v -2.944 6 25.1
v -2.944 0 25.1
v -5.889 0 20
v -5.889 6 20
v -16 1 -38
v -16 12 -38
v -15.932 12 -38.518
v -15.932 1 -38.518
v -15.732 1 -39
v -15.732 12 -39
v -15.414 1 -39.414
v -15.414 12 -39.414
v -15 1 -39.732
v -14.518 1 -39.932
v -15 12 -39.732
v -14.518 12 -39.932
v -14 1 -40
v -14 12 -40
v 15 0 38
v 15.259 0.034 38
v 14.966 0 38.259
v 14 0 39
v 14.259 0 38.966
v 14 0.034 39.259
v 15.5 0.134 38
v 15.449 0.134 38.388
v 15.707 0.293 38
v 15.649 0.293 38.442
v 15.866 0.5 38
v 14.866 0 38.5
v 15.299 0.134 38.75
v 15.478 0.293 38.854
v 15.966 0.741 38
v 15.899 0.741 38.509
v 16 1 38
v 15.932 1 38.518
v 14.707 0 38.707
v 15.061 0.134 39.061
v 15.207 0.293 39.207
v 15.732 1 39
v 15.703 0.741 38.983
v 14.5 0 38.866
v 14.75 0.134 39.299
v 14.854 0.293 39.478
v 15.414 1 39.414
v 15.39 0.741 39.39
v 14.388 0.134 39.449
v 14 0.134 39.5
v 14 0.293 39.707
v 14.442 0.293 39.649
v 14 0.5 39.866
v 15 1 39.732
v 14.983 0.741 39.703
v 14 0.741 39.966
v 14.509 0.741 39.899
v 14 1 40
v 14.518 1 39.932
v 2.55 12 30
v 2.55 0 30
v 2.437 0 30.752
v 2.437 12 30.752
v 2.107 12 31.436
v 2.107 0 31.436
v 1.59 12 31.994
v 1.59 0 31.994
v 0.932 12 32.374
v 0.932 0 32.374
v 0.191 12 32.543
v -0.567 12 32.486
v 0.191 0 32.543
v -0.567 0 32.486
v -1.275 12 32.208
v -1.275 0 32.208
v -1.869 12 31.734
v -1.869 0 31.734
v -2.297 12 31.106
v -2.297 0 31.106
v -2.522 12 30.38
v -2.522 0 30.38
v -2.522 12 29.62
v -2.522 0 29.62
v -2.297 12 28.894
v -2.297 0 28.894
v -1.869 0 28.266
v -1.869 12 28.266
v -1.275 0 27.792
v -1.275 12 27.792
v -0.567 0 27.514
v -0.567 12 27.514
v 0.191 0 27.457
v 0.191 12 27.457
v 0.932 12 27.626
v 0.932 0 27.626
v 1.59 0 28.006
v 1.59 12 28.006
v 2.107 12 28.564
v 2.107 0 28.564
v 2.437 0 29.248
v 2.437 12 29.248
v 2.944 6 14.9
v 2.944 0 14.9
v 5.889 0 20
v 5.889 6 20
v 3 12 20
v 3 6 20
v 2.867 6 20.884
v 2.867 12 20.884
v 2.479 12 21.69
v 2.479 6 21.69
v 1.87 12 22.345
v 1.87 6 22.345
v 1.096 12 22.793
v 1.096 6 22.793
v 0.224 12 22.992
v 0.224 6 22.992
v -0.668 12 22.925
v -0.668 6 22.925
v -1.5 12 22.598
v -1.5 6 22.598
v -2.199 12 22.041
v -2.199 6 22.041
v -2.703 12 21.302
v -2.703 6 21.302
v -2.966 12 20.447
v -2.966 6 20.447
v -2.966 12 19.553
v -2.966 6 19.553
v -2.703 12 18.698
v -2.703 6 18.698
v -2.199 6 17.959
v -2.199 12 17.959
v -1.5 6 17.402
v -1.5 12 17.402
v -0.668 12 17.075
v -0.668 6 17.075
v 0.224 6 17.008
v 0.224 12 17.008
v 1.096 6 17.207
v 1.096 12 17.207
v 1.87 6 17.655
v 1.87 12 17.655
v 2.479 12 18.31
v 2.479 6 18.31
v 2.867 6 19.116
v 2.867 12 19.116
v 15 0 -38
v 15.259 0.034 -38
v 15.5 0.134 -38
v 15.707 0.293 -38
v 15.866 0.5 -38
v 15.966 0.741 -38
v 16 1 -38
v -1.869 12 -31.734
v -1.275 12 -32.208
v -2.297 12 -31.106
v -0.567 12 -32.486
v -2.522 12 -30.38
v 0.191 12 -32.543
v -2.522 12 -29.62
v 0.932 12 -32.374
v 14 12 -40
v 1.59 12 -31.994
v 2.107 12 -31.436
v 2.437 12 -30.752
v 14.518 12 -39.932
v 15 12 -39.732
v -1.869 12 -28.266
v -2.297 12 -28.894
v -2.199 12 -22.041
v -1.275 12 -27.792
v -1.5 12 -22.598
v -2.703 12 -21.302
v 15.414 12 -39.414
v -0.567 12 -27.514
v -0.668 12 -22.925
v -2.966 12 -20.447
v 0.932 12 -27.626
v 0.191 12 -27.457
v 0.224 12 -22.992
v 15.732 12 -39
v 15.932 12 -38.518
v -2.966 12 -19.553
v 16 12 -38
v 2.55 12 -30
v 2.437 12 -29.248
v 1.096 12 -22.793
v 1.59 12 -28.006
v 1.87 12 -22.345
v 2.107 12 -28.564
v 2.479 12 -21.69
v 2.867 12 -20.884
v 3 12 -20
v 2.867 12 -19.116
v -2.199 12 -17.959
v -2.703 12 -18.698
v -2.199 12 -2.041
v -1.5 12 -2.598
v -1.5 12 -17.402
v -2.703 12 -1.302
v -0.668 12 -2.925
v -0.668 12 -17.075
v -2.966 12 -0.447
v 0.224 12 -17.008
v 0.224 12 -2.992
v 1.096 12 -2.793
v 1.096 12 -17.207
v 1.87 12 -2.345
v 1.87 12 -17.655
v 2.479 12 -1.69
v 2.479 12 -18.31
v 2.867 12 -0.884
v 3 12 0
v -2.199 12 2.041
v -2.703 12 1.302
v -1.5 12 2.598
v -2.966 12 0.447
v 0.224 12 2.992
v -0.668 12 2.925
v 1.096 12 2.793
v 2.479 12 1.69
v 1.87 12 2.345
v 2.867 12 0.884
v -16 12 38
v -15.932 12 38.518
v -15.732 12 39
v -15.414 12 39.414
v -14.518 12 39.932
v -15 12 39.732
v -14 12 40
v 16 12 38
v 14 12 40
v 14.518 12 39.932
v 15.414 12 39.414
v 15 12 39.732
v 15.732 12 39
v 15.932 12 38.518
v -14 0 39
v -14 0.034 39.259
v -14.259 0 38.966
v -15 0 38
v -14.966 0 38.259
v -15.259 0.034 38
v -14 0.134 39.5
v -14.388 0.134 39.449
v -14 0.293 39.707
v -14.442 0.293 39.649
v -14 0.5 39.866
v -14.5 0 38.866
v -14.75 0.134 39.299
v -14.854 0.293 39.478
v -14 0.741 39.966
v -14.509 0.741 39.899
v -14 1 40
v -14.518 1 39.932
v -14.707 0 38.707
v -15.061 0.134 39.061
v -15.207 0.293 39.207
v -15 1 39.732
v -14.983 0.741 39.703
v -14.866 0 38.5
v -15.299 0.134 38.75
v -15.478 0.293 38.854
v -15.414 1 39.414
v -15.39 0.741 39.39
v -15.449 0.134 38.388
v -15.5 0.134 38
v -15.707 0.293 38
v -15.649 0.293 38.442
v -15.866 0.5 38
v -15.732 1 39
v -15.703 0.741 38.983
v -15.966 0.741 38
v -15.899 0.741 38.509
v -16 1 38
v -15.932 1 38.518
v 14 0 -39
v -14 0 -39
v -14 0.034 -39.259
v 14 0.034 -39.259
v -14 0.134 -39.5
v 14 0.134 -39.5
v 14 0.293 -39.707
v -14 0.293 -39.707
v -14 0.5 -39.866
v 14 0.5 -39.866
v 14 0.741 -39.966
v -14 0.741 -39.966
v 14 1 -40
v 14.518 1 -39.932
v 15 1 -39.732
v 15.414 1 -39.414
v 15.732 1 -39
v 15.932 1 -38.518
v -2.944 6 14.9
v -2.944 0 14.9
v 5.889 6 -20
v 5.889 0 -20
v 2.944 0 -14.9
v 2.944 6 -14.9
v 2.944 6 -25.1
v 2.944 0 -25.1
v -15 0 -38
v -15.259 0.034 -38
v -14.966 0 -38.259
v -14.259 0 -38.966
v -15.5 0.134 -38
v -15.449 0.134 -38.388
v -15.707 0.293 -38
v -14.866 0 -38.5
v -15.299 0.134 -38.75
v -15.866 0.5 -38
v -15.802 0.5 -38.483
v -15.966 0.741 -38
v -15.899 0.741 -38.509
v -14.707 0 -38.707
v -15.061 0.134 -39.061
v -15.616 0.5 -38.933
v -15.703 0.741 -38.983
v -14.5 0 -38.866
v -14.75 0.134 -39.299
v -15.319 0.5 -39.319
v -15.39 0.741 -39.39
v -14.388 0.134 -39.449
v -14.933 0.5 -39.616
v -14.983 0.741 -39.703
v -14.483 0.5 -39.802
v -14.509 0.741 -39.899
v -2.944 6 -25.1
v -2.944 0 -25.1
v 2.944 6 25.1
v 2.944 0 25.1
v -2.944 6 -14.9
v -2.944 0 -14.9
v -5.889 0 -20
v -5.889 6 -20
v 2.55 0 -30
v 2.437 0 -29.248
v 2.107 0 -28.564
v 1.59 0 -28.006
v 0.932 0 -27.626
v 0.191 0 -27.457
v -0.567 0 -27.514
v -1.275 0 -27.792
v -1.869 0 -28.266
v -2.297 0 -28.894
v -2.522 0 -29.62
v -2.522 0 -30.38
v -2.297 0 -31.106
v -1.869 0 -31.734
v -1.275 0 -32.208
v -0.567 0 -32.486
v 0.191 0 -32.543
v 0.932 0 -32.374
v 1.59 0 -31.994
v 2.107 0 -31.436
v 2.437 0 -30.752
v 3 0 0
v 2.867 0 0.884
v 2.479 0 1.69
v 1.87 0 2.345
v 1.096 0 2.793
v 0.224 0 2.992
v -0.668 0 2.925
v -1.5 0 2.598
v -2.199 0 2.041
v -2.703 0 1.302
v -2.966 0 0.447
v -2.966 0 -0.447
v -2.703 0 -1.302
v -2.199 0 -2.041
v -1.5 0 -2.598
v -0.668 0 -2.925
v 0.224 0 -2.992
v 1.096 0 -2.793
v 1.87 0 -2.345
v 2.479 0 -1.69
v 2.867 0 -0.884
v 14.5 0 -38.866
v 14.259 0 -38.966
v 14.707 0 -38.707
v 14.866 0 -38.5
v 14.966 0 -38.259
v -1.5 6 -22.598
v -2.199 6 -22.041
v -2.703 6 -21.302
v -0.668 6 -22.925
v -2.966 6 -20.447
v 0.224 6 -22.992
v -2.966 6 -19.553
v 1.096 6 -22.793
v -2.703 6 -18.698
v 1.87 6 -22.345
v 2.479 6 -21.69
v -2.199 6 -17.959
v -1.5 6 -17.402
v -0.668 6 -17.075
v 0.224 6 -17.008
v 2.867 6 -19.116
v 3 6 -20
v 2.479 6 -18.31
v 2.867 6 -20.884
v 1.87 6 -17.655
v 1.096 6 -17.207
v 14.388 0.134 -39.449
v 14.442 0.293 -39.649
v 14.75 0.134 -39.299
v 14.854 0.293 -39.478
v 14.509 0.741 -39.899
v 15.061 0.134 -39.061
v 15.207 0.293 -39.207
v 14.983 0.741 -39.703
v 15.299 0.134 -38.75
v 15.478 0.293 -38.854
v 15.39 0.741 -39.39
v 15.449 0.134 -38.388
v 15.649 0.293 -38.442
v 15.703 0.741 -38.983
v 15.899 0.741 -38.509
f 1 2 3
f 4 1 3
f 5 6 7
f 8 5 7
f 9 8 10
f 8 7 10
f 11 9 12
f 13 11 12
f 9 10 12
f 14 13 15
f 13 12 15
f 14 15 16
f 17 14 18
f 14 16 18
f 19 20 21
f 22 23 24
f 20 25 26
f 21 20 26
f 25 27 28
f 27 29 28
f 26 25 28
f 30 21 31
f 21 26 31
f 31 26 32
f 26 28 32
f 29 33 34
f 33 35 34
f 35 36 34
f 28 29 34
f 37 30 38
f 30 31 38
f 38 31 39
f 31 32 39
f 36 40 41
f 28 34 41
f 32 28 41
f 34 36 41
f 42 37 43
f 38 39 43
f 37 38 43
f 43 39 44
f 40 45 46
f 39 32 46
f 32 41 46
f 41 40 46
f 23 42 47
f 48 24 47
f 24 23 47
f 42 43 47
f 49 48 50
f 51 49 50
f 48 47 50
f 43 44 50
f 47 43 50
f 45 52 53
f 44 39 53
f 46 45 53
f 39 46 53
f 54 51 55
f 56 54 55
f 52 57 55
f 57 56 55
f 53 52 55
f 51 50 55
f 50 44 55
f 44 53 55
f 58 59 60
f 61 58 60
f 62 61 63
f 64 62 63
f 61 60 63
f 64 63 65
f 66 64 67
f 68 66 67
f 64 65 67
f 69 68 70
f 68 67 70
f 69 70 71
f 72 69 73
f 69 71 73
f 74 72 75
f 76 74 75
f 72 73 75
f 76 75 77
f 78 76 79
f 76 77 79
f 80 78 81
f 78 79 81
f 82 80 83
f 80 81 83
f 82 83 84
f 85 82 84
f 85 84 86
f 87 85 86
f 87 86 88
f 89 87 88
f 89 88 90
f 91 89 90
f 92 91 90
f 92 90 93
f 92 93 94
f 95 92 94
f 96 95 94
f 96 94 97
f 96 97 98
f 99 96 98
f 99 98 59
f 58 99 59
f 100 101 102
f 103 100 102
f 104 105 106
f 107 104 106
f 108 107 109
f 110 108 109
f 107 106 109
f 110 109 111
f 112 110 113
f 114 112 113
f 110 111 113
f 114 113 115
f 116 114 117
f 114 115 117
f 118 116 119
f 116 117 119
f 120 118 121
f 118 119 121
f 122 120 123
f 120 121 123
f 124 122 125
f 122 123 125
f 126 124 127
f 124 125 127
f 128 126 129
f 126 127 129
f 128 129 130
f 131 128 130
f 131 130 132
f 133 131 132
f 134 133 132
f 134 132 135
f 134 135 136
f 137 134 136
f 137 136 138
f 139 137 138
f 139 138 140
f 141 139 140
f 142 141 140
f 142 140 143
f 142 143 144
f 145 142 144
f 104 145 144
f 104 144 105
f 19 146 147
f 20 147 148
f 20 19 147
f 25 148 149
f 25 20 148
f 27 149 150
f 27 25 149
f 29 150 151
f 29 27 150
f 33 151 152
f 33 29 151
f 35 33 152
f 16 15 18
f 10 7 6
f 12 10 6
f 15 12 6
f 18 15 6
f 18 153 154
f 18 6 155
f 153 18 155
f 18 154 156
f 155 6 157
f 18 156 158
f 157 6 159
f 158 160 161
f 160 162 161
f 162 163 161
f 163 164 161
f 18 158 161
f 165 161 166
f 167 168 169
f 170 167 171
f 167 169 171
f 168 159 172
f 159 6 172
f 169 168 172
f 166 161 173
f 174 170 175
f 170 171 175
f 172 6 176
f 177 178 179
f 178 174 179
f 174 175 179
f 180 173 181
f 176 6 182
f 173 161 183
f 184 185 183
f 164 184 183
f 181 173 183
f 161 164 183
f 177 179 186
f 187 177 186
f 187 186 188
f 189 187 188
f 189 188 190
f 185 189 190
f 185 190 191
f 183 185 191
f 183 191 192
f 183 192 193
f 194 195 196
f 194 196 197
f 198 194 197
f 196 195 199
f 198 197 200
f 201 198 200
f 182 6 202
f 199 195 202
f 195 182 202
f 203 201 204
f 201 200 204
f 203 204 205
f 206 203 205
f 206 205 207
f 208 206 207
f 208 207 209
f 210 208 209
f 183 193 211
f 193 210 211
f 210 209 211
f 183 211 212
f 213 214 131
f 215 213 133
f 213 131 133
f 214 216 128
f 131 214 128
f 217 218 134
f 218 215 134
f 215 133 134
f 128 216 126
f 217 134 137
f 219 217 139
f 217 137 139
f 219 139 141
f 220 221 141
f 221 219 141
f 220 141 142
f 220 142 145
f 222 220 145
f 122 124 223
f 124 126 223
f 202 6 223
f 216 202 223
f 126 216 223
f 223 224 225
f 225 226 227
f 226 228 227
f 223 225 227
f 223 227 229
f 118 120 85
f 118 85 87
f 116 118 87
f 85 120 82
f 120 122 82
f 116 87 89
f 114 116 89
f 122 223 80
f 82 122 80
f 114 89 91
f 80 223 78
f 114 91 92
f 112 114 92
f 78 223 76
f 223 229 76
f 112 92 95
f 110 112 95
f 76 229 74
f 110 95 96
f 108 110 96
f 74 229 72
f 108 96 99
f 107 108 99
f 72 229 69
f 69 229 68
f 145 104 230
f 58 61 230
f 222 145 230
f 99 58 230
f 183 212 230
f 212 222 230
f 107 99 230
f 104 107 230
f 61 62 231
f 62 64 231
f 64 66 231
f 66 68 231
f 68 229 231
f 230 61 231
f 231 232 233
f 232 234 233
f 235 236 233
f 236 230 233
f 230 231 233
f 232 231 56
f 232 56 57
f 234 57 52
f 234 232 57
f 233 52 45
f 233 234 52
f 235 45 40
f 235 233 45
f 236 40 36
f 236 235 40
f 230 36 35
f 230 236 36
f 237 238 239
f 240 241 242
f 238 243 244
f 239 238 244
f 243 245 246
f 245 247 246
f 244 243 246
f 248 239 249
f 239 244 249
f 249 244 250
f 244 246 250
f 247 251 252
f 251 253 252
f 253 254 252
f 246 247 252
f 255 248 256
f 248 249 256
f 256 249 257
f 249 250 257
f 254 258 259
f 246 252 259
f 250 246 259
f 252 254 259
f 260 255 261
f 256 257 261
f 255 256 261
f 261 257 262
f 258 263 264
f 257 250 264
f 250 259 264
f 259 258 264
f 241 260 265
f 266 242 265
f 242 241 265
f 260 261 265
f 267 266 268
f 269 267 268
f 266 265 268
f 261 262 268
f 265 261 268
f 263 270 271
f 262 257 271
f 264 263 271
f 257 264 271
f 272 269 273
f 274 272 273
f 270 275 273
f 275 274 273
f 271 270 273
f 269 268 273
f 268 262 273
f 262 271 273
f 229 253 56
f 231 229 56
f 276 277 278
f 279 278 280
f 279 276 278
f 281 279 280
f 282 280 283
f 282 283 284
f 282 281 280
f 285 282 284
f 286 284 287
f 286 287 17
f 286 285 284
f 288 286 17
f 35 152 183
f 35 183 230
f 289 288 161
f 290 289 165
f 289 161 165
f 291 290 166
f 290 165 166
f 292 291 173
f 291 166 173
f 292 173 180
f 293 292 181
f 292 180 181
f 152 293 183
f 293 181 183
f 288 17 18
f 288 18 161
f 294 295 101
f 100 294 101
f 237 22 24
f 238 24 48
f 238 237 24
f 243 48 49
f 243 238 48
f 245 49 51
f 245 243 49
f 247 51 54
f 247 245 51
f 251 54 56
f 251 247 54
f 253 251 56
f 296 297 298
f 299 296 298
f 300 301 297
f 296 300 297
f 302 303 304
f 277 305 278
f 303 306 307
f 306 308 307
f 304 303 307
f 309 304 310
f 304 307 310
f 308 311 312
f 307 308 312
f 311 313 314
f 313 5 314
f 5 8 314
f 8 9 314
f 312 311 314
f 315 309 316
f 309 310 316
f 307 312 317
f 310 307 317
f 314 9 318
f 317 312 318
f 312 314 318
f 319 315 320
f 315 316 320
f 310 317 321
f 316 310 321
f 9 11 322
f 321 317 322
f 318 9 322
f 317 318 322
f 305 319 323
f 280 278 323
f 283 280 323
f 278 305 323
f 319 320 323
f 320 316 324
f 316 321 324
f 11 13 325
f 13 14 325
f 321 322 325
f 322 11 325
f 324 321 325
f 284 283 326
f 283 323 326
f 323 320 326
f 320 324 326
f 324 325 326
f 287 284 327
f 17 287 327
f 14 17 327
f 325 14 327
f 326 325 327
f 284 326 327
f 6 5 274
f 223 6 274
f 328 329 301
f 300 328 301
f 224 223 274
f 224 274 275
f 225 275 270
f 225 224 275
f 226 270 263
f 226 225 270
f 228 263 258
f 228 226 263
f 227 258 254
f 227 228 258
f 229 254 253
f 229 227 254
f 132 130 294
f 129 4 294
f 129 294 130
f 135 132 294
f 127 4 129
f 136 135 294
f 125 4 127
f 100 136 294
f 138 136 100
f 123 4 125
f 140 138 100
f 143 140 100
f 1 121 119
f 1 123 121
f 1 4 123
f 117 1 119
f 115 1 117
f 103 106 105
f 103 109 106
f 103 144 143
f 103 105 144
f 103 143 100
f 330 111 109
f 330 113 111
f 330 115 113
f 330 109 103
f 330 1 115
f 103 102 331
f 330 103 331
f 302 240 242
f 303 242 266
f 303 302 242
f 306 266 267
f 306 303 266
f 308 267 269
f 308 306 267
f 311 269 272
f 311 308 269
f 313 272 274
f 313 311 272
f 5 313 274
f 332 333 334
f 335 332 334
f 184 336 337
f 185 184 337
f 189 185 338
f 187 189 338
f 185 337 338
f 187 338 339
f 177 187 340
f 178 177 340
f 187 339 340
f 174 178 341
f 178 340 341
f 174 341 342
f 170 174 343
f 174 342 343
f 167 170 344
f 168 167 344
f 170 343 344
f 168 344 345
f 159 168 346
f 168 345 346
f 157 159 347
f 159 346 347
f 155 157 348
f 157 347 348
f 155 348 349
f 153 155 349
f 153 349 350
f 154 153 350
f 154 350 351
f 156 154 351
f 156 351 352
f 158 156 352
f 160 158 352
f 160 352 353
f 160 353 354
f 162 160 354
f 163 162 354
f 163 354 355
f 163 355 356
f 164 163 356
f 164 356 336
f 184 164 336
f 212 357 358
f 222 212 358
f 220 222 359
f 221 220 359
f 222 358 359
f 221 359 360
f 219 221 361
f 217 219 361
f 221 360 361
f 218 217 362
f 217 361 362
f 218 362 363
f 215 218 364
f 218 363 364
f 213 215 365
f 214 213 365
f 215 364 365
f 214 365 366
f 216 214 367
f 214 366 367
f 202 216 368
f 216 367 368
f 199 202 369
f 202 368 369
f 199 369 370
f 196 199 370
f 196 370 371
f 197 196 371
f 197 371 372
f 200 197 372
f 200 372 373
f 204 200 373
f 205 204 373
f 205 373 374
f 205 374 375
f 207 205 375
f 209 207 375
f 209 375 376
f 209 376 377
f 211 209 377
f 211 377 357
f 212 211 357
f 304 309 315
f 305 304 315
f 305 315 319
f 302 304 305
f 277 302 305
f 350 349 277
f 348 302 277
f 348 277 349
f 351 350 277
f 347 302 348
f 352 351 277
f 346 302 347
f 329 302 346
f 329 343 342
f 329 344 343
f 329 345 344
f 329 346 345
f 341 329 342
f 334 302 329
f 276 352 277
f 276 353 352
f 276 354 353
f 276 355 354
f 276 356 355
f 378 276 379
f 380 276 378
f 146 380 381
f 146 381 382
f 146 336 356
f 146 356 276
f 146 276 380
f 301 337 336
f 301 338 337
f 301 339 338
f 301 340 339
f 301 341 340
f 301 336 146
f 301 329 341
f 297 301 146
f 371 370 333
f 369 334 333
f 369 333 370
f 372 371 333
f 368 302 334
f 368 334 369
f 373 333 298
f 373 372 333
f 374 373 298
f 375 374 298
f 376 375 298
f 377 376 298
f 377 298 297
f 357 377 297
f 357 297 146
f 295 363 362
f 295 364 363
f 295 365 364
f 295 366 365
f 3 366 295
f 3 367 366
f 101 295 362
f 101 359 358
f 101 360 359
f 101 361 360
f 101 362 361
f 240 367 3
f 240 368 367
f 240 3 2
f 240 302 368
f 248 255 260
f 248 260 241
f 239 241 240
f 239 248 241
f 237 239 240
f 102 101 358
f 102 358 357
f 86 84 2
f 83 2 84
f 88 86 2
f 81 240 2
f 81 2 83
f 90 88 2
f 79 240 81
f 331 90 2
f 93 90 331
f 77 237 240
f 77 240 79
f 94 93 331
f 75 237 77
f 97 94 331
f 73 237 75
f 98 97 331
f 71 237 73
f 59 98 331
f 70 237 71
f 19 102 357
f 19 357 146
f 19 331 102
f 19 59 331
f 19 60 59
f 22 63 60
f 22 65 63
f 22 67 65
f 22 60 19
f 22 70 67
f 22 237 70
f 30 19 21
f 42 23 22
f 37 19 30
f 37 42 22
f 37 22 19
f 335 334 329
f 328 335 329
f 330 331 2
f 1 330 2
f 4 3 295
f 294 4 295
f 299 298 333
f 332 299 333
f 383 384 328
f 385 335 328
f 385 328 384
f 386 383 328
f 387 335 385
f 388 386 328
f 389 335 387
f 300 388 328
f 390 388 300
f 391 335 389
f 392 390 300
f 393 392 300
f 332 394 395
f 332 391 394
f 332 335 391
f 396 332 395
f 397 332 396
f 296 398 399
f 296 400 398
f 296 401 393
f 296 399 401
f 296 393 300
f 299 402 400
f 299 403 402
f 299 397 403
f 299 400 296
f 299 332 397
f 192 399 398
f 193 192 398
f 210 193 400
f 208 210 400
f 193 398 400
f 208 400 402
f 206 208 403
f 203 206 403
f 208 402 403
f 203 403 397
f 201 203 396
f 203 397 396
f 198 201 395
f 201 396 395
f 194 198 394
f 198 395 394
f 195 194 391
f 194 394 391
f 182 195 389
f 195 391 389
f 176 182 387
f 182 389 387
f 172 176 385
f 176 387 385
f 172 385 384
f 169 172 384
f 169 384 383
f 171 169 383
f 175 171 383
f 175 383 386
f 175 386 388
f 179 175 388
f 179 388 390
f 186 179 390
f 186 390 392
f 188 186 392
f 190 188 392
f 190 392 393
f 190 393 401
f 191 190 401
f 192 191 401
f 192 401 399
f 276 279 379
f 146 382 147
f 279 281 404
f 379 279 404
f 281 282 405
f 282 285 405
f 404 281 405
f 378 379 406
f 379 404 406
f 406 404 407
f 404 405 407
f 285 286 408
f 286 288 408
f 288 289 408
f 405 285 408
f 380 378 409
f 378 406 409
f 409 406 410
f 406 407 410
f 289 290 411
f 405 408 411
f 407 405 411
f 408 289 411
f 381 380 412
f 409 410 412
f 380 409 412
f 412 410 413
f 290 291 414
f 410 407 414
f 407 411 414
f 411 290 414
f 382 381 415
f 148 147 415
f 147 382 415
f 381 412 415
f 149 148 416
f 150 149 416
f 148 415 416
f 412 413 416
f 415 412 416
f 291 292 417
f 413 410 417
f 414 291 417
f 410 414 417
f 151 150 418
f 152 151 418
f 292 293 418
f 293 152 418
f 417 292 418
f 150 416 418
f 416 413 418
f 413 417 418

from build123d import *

# Parameters (mm, degrees)
SKETCH_W      = 32
SKETCH_H      = 80
PAD_DEPTH     = 12
SKETCH001_R   = 2.55
HOLE_DEPTH    = 25
SKETCH002_R   = 3
HOLE001_DEPTH = 12.001
SKETCH003_R   = 3
HOLE002_DEPTH = 25
FILLET_R      = 2
FILLET001_R   = 1
POCKET_DEPTH  = 6


with BuildPart() as part:
    # Sketch → Pad (new body)
    with BuildSketch(Plane.XZ):
        Rectangle(SKETCH_W, SKETCH_H)
    extrude(amount=-PAD_DEPTH)

    # Sketch001 → Hole (cut)
    with BuildSketch(Plane.XZ):
        with Locations((0, 30)):
            Circle(SKETCH001_R)
        with Locations((0, -30)):
            Circle(SKETCH001_R)
    extrude(amount=-HOLE_DEPTH, mode=Mode.SUBTRACT)

    # Sketch002 → Hole001 (cut, through all)
    with BuildSketch(Plane.XZ):
        with Locations((0, 20)):
            Circle(SKETCH002_R)
        with Locations((0, -20)):
            Circle(SKETCH002_R)
    extrude(amount=-HOLE001_DEPTH, mode=Mode.SUBTRACT)

    # Sketch003 → Hole002 (cut)
    with BuildSketch(Plane.XZ):
        Circle(SKETCH003_R)
    extrude(amount=-HOLE002_DEPTH, mode=Mode.SUBTRACT)

    # Fillet
    fillet_edges = [part.edges().sort_by_distance(p)[0] for p in [
        (-16, 6, 40),
        (16, 6, 40),
        (16, 6, -40),
        (-16, 6, -40),
    ]]
    fillet(fillet_edges, radius=FILLET_R)

    # Fillet001
    fillet001_edges = [part.edges().sort_by_distance(p)[0] for p in [
        (0, 0, -40),
        (-15.414214, 0, -39.414214),
        (-16, 0, 0),
        (-15.414214, 0, 39.414214),
        (0, 0, 40),
        (15.414214, 0, 39.414214),
        (16, 0, 0),
        (15.414214, 0, -39.414214),
    ]]
    fillet(fillet001_edges, radius=FILLET001_R)

    # Sketch004 → Pocket (cut)
    with BuildSketch(Plane.XZ):
        Polygon((2.944486, 25.1), (-2.944486, 25.1), (-5.888973, 20), (-2.944486, 14.9), (2.944486, 14.9), (5.888973, 20), align=None)
        Polygon((2.944486, -14.9), (-2.944486, -14.9), (-5.888973, -20), (-2.944486, -25.1), (2.944486, -25.1), (5.888973, -20), align=None)
    extrude(amount=-POCKET_DEPTH, mode=Mode.SUBTRACT)


solid = part.part
